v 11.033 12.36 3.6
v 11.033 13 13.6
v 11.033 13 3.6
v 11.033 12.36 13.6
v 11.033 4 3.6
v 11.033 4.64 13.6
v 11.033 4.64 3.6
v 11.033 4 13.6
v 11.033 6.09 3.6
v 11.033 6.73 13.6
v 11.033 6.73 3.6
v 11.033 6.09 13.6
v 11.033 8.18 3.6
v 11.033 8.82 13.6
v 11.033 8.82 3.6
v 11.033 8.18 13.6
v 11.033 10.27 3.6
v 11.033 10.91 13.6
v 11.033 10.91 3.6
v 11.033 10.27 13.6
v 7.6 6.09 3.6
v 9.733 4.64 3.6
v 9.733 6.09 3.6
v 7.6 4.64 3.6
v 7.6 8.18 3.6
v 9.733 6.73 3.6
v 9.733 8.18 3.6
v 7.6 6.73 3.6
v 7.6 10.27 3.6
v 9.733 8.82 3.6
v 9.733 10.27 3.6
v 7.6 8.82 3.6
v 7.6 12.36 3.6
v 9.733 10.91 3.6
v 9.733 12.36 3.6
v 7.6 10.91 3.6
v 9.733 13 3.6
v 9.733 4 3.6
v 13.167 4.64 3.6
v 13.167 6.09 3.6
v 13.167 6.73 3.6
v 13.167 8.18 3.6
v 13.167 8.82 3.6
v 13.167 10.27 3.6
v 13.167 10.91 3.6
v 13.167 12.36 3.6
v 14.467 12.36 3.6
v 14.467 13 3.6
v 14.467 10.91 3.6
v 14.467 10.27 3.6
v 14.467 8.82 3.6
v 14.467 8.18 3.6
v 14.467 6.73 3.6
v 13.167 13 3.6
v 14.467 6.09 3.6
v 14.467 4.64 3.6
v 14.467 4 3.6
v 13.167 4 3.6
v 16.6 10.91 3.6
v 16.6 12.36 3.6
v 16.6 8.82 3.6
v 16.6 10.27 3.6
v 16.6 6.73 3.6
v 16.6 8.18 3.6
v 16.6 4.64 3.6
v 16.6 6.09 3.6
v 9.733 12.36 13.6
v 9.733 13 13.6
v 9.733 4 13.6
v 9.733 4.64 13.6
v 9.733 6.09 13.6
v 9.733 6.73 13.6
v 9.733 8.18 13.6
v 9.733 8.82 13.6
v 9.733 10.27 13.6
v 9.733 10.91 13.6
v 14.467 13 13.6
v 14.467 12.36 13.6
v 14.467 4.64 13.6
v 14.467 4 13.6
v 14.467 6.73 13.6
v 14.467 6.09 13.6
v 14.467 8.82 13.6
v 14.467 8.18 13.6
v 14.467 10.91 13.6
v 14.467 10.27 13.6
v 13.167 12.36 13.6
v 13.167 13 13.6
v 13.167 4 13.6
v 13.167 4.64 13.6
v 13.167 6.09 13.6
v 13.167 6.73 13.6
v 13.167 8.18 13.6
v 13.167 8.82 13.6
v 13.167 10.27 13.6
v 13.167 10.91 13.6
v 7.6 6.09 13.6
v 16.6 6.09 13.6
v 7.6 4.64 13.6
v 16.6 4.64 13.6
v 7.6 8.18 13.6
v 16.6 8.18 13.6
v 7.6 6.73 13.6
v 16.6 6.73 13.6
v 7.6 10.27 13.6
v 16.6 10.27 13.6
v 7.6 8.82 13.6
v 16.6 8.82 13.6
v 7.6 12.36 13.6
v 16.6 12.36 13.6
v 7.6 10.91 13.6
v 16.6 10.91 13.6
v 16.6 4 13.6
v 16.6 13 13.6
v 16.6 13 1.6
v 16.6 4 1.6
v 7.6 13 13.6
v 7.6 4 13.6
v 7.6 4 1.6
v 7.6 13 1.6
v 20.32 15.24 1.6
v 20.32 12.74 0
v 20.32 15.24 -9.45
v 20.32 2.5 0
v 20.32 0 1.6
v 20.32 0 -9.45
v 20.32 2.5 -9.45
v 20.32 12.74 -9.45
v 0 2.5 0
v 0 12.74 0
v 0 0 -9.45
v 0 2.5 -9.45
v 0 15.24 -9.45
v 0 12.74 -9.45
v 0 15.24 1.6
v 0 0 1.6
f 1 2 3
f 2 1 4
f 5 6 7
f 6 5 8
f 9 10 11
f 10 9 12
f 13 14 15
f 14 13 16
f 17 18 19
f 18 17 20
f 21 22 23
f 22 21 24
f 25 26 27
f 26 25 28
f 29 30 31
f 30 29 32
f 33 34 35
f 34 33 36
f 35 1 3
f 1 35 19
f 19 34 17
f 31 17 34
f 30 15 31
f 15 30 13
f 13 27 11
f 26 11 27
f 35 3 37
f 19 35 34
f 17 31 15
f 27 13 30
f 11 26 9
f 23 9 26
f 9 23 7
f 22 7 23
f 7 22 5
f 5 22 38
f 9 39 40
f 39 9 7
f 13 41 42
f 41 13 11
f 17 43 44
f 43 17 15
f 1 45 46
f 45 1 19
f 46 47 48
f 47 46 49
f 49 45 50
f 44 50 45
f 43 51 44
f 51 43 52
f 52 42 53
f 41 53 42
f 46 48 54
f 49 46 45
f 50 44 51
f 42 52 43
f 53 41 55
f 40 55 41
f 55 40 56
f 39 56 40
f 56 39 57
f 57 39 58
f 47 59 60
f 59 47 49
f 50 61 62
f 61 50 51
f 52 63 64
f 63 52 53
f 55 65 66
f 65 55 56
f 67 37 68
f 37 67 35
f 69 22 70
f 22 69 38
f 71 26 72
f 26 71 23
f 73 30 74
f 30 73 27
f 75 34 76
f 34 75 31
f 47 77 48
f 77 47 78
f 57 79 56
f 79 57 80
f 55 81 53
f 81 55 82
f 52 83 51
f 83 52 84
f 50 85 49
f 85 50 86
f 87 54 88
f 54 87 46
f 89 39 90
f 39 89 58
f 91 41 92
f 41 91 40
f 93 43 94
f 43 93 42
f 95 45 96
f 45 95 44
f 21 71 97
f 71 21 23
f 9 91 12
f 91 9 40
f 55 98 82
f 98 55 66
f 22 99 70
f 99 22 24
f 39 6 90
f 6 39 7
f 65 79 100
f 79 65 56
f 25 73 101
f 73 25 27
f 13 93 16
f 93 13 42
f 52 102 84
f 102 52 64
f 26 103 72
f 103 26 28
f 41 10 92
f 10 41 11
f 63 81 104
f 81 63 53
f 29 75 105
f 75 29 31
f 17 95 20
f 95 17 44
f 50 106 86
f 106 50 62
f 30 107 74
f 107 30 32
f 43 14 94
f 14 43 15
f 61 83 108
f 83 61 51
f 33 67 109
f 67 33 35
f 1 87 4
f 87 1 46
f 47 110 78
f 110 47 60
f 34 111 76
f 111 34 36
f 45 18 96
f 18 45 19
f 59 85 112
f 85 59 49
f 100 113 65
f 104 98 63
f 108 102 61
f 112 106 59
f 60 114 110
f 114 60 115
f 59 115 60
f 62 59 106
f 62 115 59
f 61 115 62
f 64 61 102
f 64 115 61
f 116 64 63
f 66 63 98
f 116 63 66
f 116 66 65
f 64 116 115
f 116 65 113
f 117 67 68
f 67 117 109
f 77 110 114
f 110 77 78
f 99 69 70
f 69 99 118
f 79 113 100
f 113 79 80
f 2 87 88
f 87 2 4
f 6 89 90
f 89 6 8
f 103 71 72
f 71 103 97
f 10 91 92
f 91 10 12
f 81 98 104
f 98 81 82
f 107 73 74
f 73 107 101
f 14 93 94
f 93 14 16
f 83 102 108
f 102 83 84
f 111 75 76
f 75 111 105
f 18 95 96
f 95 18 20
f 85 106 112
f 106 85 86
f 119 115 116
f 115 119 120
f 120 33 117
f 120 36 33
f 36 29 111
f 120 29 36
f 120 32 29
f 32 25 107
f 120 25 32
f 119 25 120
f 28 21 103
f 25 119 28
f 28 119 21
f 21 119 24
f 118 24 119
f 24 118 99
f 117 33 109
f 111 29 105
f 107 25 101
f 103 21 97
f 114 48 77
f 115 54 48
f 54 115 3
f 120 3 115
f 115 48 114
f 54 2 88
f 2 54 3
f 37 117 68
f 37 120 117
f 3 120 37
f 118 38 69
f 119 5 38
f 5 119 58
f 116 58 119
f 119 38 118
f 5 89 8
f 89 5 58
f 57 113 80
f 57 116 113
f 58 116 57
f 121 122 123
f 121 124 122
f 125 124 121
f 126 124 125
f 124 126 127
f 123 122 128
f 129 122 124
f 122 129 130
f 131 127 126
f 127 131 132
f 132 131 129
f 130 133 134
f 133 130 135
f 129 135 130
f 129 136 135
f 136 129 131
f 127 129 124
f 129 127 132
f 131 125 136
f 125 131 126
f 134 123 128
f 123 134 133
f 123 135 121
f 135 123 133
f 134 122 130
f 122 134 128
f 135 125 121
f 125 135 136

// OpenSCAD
// file: ../vitamins/tmc2130.scad
include <../settings/dimensions.scad>

module tmc2130_pcb() {
    color("DimGrey") {
        cube([tmc_l, tmc_w, tmc_t]);
    }
}

module heatsink() {
    hs_l = 9.0;
    hs_w = 9.0;
    hs_h = 12.0;

    num_fin_y = 5;
    num_fin_x = 3;
    fin_spacing_x = 1.3;
    fin_thickness_x = (hs_l - ((num_fin_x-1)*fin_spacing_x))/num_fin_x;
    fin_spacing_y = 1.45;
    fin_thickness_y = (hs_w - ((num_fin_y-1)*fin_spacing_y))/num_fin_y;

    color("Blue") difference() {
        cube([hs_l, hs_w, hs_h]);

        for (x=[0:num_fin_x-2]) {
            translate([(x+1)*fin_thickness_x+x*fin_spacing_x,-1,2])cube([fin_spacing_x,hs_w+2,hs_h]);
        }

        for (y=[0:num_fin_y-2]) {
            translate([-1,(y+1)*fin_thickness_y+y*fin_spacing_y,2])cube([hs_l+2,fin_spacing_y,hs_h]);
        }
    }
}

tmc2130_pcb();
translate([tmc_l+5,0,0])heatsink();
// file: ../settings/dimensions.scad
// Defualt Quality
$fn = 25;

// PCB Dimensions - mm
pcb_l = 109.67;
pcb_w = 84.30;
pcb_t = 1.6;

hole_dia = 3.2;
hole_x_spacing = 101.85;
hole_y_spacing = 76.10;

// PCB Component Locations - mm from center
usb_x = (-pcb_l/2) + 24.11;
usb_y = (-pcb_w/2);

uSD_x = (-pcb_l/2) + 42.46;
uSD_y = (-pcb_w/2) - 0.71;

// TMC2130 Dimensions - mm
tmc_l = 20.32;
tmc_w = 15.24;
tmc_t = 1.6;
tmc_offset_from_pcb = 11.05;
// main file
include <../settings/dimensions.scad>
use <../vitamins/tmc2130.scad>

module stepper_stick() {
    tmc2130_pcb();
    translate([7.6,4,tmc_t])heatsink();

    color("Black") {
        translate([0,0,-tmc_offset_from_pcb+pcb_t])cube([tmc_l, 2.5, tmc_offset_from_pcb-pcb_t]);
        translate([0,tmc_w-2.5,-tmc_offset_from_pcb+pcb_t])cube([tmc_l, 2.5, tmc_offset_from_pcb-pcb_t]);
    }
}

stepper_stick();
